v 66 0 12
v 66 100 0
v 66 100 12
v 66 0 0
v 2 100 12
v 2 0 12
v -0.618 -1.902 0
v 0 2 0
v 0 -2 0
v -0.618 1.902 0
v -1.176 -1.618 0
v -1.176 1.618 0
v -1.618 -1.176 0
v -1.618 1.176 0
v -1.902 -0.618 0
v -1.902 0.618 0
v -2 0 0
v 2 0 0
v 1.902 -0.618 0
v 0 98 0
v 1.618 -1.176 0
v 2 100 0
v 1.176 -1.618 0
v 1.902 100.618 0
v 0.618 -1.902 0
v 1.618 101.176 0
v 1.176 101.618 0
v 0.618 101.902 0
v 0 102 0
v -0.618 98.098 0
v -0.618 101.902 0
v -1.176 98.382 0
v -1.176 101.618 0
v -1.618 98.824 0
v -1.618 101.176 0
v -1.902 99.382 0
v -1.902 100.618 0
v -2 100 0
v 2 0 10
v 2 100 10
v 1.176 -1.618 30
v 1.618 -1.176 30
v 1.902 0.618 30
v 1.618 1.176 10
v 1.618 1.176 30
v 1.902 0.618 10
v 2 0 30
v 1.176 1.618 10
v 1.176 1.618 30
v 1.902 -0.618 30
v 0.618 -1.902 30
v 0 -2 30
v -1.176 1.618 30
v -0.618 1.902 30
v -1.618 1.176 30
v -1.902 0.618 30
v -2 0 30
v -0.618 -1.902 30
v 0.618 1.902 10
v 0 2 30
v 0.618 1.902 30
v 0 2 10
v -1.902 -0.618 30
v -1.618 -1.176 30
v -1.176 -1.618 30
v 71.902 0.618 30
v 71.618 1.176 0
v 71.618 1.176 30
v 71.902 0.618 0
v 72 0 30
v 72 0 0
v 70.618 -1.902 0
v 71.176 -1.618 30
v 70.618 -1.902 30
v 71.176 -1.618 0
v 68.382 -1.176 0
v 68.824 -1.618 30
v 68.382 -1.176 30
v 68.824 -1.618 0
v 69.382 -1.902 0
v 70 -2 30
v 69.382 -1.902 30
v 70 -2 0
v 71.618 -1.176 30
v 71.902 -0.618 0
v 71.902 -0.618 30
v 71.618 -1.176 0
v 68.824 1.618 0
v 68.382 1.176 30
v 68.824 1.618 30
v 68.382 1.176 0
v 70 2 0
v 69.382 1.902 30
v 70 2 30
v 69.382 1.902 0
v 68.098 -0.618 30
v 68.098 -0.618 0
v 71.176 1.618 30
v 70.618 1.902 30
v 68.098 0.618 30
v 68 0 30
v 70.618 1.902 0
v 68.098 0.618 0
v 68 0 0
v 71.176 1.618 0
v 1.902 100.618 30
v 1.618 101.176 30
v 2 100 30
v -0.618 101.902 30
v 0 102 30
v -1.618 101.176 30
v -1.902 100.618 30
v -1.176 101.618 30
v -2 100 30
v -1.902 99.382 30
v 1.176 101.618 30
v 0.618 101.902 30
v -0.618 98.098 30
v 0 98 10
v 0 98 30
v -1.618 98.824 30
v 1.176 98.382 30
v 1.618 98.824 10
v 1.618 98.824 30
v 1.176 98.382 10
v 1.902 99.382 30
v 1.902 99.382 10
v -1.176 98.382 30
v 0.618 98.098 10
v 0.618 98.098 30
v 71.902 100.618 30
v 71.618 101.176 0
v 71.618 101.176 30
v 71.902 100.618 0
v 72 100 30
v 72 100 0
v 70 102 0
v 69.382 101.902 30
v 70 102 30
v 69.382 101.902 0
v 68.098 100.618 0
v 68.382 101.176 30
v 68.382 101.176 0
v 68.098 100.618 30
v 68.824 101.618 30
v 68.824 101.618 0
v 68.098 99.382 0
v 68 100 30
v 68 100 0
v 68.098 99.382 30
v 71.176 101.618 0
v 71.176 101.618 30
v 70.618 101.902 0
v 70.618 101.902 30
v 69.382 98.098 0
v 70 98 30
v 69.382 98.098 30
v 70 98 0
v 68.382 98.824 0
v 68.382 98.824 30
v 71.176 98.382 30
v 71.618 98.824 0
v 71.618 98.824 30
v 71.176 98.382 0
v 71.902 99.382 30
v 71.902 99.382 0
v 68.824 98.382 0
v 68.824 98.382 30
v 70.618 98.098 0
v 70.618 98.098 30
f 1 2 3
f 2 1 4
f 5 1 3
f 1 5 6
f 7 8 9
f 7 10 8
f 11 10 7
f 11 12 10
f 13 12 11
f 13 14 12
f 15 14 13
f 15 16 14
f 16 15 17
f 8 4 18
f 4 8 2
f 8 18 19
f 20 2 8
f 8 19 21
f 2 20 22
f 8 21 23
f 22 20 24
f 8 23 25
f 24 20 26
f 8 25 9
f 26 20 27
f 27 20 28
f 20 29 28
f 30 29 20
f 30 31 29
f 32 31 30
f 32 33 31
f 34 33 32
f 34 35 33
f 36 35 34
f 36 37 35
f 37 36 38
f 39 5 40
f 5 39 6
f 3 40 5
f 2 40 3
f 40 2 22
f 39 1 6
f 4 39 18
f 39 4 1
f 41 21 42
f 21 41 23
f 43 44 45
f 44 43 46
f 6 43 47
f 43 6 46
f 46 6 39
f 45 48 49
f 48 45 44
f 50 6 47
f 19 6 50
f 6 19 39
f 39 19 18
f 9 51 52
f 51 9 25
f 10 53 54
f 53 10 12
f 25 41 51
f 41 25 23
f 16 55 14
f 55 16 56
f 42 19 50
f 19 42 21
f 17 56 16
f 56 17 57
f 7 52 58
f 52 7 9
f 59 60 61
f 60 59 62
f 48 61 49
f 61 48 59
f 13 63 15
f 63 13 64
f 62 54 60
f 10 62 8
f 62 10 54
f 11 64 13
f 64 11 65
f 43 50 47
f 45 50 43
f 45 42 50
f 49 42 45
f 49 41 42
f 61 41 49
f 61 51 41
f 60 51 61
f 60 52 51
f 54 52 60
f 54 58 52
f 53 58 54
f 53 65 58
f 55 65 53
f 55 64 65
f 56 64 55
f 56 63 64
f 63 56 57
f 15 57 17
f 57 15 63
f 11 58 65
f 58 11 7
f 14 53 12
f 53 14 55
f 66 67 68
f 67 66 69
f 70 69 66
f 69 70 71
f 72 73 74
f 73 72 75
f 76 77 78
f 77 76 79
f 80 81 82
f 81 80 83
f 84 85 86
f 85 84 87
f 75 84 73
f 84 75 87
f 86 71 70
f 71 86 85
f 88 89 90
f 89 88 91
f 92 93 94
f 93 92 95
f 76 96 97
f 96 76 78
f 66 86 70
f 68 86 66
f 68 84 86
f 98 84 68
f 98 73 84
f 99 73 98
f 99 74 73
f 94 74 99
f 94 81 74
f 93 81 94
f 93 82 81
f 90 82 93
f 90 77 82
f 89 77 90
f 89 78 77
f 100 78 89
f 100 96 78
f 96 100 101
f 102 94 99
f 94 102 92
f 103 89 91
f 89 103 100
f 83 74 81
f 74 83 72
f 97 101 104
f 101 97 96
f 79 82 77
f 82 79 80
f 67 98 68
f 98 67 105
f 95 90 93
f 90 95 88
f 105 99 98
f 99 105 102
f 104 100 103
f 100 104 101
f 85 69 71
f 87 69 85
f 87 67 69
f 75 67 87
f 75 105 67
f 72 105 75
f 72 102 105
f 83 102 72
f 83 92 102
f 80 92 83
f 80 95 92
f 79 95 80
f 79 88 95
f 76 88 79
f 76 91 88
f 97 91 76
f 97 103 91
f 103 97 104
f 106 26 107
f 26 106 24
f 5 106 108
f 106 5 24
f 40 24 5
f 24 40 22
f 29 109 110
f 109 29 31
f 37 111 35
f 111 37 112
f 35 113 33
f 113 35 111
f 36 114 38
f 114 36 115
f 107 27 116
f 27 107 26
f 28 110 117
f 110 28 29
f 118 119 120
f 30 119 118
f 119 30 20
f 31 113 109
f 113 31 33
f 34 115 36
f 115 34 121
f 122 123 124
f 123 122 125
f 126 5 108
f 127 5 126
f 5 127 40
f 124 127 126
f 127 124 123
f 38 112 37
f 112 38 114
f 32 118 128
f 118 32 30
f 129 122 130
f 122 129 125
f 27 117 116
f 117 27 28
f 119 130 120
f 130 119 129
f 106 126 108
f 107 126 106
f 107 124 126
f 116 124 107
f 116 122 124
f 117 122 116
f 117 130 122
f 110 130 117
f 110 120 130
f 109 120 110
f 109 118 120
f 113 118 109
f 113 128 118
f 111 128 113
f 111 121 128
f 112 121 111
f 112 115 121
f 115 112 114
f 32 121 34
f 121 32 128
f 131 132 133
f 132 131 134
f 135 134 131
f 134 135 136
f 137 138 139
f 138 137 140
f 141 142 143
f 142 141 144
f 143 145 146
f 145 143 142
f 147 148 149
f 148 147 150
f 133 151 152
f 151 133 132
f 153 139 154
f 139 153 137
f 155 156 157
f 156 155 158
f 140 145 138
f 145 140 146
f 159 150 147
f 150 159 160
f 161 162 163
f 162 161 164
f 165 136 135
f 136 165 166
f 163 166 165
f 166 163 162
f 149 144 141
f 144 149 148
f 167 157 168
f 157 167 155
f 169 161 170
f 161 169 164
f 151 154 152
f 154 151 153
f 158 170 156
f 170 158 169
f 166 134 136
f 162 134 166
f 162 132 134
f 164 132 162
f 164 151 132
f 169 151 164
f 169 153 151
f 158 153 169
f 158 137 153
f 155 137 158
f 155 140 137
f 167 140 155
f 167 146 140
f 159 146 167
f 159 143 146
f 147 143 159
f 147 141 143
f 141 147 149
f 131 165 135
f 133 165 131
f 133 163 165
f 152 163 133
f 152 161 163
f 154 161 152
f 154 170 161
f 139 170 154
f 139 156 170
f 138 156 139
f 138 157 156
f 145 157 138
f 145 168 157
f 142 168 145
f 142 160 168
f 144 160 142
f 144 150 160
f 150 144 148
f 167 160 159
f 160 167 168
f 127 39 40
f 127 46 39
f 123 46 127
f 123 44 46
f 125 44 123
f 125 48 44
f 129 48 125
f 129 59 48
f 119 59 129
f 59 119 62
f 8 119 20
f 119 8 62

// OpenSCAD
bw = 64;
bl = 100;
bh = 12;

bxh = 30;
bxw = 70;
bxl = 100;

// Corner radius
cr = 4;

$fn = 20;

#translate([2,0,0]) cube([bw, bl, bh]);
translate([0, 0, 0]) cylinder(d=cr, h = bxh);
translate([bxw,0,0]) cylinder(d=cr, h = bxh);
translate([0,bxl,0]) cylinder(d=cr, h = bxh);
translate([bxw,bxl,0]) cylinder(d=cr, h = bxh);

cube([bw, bl,10]);
//cube([bxh, bxw,
